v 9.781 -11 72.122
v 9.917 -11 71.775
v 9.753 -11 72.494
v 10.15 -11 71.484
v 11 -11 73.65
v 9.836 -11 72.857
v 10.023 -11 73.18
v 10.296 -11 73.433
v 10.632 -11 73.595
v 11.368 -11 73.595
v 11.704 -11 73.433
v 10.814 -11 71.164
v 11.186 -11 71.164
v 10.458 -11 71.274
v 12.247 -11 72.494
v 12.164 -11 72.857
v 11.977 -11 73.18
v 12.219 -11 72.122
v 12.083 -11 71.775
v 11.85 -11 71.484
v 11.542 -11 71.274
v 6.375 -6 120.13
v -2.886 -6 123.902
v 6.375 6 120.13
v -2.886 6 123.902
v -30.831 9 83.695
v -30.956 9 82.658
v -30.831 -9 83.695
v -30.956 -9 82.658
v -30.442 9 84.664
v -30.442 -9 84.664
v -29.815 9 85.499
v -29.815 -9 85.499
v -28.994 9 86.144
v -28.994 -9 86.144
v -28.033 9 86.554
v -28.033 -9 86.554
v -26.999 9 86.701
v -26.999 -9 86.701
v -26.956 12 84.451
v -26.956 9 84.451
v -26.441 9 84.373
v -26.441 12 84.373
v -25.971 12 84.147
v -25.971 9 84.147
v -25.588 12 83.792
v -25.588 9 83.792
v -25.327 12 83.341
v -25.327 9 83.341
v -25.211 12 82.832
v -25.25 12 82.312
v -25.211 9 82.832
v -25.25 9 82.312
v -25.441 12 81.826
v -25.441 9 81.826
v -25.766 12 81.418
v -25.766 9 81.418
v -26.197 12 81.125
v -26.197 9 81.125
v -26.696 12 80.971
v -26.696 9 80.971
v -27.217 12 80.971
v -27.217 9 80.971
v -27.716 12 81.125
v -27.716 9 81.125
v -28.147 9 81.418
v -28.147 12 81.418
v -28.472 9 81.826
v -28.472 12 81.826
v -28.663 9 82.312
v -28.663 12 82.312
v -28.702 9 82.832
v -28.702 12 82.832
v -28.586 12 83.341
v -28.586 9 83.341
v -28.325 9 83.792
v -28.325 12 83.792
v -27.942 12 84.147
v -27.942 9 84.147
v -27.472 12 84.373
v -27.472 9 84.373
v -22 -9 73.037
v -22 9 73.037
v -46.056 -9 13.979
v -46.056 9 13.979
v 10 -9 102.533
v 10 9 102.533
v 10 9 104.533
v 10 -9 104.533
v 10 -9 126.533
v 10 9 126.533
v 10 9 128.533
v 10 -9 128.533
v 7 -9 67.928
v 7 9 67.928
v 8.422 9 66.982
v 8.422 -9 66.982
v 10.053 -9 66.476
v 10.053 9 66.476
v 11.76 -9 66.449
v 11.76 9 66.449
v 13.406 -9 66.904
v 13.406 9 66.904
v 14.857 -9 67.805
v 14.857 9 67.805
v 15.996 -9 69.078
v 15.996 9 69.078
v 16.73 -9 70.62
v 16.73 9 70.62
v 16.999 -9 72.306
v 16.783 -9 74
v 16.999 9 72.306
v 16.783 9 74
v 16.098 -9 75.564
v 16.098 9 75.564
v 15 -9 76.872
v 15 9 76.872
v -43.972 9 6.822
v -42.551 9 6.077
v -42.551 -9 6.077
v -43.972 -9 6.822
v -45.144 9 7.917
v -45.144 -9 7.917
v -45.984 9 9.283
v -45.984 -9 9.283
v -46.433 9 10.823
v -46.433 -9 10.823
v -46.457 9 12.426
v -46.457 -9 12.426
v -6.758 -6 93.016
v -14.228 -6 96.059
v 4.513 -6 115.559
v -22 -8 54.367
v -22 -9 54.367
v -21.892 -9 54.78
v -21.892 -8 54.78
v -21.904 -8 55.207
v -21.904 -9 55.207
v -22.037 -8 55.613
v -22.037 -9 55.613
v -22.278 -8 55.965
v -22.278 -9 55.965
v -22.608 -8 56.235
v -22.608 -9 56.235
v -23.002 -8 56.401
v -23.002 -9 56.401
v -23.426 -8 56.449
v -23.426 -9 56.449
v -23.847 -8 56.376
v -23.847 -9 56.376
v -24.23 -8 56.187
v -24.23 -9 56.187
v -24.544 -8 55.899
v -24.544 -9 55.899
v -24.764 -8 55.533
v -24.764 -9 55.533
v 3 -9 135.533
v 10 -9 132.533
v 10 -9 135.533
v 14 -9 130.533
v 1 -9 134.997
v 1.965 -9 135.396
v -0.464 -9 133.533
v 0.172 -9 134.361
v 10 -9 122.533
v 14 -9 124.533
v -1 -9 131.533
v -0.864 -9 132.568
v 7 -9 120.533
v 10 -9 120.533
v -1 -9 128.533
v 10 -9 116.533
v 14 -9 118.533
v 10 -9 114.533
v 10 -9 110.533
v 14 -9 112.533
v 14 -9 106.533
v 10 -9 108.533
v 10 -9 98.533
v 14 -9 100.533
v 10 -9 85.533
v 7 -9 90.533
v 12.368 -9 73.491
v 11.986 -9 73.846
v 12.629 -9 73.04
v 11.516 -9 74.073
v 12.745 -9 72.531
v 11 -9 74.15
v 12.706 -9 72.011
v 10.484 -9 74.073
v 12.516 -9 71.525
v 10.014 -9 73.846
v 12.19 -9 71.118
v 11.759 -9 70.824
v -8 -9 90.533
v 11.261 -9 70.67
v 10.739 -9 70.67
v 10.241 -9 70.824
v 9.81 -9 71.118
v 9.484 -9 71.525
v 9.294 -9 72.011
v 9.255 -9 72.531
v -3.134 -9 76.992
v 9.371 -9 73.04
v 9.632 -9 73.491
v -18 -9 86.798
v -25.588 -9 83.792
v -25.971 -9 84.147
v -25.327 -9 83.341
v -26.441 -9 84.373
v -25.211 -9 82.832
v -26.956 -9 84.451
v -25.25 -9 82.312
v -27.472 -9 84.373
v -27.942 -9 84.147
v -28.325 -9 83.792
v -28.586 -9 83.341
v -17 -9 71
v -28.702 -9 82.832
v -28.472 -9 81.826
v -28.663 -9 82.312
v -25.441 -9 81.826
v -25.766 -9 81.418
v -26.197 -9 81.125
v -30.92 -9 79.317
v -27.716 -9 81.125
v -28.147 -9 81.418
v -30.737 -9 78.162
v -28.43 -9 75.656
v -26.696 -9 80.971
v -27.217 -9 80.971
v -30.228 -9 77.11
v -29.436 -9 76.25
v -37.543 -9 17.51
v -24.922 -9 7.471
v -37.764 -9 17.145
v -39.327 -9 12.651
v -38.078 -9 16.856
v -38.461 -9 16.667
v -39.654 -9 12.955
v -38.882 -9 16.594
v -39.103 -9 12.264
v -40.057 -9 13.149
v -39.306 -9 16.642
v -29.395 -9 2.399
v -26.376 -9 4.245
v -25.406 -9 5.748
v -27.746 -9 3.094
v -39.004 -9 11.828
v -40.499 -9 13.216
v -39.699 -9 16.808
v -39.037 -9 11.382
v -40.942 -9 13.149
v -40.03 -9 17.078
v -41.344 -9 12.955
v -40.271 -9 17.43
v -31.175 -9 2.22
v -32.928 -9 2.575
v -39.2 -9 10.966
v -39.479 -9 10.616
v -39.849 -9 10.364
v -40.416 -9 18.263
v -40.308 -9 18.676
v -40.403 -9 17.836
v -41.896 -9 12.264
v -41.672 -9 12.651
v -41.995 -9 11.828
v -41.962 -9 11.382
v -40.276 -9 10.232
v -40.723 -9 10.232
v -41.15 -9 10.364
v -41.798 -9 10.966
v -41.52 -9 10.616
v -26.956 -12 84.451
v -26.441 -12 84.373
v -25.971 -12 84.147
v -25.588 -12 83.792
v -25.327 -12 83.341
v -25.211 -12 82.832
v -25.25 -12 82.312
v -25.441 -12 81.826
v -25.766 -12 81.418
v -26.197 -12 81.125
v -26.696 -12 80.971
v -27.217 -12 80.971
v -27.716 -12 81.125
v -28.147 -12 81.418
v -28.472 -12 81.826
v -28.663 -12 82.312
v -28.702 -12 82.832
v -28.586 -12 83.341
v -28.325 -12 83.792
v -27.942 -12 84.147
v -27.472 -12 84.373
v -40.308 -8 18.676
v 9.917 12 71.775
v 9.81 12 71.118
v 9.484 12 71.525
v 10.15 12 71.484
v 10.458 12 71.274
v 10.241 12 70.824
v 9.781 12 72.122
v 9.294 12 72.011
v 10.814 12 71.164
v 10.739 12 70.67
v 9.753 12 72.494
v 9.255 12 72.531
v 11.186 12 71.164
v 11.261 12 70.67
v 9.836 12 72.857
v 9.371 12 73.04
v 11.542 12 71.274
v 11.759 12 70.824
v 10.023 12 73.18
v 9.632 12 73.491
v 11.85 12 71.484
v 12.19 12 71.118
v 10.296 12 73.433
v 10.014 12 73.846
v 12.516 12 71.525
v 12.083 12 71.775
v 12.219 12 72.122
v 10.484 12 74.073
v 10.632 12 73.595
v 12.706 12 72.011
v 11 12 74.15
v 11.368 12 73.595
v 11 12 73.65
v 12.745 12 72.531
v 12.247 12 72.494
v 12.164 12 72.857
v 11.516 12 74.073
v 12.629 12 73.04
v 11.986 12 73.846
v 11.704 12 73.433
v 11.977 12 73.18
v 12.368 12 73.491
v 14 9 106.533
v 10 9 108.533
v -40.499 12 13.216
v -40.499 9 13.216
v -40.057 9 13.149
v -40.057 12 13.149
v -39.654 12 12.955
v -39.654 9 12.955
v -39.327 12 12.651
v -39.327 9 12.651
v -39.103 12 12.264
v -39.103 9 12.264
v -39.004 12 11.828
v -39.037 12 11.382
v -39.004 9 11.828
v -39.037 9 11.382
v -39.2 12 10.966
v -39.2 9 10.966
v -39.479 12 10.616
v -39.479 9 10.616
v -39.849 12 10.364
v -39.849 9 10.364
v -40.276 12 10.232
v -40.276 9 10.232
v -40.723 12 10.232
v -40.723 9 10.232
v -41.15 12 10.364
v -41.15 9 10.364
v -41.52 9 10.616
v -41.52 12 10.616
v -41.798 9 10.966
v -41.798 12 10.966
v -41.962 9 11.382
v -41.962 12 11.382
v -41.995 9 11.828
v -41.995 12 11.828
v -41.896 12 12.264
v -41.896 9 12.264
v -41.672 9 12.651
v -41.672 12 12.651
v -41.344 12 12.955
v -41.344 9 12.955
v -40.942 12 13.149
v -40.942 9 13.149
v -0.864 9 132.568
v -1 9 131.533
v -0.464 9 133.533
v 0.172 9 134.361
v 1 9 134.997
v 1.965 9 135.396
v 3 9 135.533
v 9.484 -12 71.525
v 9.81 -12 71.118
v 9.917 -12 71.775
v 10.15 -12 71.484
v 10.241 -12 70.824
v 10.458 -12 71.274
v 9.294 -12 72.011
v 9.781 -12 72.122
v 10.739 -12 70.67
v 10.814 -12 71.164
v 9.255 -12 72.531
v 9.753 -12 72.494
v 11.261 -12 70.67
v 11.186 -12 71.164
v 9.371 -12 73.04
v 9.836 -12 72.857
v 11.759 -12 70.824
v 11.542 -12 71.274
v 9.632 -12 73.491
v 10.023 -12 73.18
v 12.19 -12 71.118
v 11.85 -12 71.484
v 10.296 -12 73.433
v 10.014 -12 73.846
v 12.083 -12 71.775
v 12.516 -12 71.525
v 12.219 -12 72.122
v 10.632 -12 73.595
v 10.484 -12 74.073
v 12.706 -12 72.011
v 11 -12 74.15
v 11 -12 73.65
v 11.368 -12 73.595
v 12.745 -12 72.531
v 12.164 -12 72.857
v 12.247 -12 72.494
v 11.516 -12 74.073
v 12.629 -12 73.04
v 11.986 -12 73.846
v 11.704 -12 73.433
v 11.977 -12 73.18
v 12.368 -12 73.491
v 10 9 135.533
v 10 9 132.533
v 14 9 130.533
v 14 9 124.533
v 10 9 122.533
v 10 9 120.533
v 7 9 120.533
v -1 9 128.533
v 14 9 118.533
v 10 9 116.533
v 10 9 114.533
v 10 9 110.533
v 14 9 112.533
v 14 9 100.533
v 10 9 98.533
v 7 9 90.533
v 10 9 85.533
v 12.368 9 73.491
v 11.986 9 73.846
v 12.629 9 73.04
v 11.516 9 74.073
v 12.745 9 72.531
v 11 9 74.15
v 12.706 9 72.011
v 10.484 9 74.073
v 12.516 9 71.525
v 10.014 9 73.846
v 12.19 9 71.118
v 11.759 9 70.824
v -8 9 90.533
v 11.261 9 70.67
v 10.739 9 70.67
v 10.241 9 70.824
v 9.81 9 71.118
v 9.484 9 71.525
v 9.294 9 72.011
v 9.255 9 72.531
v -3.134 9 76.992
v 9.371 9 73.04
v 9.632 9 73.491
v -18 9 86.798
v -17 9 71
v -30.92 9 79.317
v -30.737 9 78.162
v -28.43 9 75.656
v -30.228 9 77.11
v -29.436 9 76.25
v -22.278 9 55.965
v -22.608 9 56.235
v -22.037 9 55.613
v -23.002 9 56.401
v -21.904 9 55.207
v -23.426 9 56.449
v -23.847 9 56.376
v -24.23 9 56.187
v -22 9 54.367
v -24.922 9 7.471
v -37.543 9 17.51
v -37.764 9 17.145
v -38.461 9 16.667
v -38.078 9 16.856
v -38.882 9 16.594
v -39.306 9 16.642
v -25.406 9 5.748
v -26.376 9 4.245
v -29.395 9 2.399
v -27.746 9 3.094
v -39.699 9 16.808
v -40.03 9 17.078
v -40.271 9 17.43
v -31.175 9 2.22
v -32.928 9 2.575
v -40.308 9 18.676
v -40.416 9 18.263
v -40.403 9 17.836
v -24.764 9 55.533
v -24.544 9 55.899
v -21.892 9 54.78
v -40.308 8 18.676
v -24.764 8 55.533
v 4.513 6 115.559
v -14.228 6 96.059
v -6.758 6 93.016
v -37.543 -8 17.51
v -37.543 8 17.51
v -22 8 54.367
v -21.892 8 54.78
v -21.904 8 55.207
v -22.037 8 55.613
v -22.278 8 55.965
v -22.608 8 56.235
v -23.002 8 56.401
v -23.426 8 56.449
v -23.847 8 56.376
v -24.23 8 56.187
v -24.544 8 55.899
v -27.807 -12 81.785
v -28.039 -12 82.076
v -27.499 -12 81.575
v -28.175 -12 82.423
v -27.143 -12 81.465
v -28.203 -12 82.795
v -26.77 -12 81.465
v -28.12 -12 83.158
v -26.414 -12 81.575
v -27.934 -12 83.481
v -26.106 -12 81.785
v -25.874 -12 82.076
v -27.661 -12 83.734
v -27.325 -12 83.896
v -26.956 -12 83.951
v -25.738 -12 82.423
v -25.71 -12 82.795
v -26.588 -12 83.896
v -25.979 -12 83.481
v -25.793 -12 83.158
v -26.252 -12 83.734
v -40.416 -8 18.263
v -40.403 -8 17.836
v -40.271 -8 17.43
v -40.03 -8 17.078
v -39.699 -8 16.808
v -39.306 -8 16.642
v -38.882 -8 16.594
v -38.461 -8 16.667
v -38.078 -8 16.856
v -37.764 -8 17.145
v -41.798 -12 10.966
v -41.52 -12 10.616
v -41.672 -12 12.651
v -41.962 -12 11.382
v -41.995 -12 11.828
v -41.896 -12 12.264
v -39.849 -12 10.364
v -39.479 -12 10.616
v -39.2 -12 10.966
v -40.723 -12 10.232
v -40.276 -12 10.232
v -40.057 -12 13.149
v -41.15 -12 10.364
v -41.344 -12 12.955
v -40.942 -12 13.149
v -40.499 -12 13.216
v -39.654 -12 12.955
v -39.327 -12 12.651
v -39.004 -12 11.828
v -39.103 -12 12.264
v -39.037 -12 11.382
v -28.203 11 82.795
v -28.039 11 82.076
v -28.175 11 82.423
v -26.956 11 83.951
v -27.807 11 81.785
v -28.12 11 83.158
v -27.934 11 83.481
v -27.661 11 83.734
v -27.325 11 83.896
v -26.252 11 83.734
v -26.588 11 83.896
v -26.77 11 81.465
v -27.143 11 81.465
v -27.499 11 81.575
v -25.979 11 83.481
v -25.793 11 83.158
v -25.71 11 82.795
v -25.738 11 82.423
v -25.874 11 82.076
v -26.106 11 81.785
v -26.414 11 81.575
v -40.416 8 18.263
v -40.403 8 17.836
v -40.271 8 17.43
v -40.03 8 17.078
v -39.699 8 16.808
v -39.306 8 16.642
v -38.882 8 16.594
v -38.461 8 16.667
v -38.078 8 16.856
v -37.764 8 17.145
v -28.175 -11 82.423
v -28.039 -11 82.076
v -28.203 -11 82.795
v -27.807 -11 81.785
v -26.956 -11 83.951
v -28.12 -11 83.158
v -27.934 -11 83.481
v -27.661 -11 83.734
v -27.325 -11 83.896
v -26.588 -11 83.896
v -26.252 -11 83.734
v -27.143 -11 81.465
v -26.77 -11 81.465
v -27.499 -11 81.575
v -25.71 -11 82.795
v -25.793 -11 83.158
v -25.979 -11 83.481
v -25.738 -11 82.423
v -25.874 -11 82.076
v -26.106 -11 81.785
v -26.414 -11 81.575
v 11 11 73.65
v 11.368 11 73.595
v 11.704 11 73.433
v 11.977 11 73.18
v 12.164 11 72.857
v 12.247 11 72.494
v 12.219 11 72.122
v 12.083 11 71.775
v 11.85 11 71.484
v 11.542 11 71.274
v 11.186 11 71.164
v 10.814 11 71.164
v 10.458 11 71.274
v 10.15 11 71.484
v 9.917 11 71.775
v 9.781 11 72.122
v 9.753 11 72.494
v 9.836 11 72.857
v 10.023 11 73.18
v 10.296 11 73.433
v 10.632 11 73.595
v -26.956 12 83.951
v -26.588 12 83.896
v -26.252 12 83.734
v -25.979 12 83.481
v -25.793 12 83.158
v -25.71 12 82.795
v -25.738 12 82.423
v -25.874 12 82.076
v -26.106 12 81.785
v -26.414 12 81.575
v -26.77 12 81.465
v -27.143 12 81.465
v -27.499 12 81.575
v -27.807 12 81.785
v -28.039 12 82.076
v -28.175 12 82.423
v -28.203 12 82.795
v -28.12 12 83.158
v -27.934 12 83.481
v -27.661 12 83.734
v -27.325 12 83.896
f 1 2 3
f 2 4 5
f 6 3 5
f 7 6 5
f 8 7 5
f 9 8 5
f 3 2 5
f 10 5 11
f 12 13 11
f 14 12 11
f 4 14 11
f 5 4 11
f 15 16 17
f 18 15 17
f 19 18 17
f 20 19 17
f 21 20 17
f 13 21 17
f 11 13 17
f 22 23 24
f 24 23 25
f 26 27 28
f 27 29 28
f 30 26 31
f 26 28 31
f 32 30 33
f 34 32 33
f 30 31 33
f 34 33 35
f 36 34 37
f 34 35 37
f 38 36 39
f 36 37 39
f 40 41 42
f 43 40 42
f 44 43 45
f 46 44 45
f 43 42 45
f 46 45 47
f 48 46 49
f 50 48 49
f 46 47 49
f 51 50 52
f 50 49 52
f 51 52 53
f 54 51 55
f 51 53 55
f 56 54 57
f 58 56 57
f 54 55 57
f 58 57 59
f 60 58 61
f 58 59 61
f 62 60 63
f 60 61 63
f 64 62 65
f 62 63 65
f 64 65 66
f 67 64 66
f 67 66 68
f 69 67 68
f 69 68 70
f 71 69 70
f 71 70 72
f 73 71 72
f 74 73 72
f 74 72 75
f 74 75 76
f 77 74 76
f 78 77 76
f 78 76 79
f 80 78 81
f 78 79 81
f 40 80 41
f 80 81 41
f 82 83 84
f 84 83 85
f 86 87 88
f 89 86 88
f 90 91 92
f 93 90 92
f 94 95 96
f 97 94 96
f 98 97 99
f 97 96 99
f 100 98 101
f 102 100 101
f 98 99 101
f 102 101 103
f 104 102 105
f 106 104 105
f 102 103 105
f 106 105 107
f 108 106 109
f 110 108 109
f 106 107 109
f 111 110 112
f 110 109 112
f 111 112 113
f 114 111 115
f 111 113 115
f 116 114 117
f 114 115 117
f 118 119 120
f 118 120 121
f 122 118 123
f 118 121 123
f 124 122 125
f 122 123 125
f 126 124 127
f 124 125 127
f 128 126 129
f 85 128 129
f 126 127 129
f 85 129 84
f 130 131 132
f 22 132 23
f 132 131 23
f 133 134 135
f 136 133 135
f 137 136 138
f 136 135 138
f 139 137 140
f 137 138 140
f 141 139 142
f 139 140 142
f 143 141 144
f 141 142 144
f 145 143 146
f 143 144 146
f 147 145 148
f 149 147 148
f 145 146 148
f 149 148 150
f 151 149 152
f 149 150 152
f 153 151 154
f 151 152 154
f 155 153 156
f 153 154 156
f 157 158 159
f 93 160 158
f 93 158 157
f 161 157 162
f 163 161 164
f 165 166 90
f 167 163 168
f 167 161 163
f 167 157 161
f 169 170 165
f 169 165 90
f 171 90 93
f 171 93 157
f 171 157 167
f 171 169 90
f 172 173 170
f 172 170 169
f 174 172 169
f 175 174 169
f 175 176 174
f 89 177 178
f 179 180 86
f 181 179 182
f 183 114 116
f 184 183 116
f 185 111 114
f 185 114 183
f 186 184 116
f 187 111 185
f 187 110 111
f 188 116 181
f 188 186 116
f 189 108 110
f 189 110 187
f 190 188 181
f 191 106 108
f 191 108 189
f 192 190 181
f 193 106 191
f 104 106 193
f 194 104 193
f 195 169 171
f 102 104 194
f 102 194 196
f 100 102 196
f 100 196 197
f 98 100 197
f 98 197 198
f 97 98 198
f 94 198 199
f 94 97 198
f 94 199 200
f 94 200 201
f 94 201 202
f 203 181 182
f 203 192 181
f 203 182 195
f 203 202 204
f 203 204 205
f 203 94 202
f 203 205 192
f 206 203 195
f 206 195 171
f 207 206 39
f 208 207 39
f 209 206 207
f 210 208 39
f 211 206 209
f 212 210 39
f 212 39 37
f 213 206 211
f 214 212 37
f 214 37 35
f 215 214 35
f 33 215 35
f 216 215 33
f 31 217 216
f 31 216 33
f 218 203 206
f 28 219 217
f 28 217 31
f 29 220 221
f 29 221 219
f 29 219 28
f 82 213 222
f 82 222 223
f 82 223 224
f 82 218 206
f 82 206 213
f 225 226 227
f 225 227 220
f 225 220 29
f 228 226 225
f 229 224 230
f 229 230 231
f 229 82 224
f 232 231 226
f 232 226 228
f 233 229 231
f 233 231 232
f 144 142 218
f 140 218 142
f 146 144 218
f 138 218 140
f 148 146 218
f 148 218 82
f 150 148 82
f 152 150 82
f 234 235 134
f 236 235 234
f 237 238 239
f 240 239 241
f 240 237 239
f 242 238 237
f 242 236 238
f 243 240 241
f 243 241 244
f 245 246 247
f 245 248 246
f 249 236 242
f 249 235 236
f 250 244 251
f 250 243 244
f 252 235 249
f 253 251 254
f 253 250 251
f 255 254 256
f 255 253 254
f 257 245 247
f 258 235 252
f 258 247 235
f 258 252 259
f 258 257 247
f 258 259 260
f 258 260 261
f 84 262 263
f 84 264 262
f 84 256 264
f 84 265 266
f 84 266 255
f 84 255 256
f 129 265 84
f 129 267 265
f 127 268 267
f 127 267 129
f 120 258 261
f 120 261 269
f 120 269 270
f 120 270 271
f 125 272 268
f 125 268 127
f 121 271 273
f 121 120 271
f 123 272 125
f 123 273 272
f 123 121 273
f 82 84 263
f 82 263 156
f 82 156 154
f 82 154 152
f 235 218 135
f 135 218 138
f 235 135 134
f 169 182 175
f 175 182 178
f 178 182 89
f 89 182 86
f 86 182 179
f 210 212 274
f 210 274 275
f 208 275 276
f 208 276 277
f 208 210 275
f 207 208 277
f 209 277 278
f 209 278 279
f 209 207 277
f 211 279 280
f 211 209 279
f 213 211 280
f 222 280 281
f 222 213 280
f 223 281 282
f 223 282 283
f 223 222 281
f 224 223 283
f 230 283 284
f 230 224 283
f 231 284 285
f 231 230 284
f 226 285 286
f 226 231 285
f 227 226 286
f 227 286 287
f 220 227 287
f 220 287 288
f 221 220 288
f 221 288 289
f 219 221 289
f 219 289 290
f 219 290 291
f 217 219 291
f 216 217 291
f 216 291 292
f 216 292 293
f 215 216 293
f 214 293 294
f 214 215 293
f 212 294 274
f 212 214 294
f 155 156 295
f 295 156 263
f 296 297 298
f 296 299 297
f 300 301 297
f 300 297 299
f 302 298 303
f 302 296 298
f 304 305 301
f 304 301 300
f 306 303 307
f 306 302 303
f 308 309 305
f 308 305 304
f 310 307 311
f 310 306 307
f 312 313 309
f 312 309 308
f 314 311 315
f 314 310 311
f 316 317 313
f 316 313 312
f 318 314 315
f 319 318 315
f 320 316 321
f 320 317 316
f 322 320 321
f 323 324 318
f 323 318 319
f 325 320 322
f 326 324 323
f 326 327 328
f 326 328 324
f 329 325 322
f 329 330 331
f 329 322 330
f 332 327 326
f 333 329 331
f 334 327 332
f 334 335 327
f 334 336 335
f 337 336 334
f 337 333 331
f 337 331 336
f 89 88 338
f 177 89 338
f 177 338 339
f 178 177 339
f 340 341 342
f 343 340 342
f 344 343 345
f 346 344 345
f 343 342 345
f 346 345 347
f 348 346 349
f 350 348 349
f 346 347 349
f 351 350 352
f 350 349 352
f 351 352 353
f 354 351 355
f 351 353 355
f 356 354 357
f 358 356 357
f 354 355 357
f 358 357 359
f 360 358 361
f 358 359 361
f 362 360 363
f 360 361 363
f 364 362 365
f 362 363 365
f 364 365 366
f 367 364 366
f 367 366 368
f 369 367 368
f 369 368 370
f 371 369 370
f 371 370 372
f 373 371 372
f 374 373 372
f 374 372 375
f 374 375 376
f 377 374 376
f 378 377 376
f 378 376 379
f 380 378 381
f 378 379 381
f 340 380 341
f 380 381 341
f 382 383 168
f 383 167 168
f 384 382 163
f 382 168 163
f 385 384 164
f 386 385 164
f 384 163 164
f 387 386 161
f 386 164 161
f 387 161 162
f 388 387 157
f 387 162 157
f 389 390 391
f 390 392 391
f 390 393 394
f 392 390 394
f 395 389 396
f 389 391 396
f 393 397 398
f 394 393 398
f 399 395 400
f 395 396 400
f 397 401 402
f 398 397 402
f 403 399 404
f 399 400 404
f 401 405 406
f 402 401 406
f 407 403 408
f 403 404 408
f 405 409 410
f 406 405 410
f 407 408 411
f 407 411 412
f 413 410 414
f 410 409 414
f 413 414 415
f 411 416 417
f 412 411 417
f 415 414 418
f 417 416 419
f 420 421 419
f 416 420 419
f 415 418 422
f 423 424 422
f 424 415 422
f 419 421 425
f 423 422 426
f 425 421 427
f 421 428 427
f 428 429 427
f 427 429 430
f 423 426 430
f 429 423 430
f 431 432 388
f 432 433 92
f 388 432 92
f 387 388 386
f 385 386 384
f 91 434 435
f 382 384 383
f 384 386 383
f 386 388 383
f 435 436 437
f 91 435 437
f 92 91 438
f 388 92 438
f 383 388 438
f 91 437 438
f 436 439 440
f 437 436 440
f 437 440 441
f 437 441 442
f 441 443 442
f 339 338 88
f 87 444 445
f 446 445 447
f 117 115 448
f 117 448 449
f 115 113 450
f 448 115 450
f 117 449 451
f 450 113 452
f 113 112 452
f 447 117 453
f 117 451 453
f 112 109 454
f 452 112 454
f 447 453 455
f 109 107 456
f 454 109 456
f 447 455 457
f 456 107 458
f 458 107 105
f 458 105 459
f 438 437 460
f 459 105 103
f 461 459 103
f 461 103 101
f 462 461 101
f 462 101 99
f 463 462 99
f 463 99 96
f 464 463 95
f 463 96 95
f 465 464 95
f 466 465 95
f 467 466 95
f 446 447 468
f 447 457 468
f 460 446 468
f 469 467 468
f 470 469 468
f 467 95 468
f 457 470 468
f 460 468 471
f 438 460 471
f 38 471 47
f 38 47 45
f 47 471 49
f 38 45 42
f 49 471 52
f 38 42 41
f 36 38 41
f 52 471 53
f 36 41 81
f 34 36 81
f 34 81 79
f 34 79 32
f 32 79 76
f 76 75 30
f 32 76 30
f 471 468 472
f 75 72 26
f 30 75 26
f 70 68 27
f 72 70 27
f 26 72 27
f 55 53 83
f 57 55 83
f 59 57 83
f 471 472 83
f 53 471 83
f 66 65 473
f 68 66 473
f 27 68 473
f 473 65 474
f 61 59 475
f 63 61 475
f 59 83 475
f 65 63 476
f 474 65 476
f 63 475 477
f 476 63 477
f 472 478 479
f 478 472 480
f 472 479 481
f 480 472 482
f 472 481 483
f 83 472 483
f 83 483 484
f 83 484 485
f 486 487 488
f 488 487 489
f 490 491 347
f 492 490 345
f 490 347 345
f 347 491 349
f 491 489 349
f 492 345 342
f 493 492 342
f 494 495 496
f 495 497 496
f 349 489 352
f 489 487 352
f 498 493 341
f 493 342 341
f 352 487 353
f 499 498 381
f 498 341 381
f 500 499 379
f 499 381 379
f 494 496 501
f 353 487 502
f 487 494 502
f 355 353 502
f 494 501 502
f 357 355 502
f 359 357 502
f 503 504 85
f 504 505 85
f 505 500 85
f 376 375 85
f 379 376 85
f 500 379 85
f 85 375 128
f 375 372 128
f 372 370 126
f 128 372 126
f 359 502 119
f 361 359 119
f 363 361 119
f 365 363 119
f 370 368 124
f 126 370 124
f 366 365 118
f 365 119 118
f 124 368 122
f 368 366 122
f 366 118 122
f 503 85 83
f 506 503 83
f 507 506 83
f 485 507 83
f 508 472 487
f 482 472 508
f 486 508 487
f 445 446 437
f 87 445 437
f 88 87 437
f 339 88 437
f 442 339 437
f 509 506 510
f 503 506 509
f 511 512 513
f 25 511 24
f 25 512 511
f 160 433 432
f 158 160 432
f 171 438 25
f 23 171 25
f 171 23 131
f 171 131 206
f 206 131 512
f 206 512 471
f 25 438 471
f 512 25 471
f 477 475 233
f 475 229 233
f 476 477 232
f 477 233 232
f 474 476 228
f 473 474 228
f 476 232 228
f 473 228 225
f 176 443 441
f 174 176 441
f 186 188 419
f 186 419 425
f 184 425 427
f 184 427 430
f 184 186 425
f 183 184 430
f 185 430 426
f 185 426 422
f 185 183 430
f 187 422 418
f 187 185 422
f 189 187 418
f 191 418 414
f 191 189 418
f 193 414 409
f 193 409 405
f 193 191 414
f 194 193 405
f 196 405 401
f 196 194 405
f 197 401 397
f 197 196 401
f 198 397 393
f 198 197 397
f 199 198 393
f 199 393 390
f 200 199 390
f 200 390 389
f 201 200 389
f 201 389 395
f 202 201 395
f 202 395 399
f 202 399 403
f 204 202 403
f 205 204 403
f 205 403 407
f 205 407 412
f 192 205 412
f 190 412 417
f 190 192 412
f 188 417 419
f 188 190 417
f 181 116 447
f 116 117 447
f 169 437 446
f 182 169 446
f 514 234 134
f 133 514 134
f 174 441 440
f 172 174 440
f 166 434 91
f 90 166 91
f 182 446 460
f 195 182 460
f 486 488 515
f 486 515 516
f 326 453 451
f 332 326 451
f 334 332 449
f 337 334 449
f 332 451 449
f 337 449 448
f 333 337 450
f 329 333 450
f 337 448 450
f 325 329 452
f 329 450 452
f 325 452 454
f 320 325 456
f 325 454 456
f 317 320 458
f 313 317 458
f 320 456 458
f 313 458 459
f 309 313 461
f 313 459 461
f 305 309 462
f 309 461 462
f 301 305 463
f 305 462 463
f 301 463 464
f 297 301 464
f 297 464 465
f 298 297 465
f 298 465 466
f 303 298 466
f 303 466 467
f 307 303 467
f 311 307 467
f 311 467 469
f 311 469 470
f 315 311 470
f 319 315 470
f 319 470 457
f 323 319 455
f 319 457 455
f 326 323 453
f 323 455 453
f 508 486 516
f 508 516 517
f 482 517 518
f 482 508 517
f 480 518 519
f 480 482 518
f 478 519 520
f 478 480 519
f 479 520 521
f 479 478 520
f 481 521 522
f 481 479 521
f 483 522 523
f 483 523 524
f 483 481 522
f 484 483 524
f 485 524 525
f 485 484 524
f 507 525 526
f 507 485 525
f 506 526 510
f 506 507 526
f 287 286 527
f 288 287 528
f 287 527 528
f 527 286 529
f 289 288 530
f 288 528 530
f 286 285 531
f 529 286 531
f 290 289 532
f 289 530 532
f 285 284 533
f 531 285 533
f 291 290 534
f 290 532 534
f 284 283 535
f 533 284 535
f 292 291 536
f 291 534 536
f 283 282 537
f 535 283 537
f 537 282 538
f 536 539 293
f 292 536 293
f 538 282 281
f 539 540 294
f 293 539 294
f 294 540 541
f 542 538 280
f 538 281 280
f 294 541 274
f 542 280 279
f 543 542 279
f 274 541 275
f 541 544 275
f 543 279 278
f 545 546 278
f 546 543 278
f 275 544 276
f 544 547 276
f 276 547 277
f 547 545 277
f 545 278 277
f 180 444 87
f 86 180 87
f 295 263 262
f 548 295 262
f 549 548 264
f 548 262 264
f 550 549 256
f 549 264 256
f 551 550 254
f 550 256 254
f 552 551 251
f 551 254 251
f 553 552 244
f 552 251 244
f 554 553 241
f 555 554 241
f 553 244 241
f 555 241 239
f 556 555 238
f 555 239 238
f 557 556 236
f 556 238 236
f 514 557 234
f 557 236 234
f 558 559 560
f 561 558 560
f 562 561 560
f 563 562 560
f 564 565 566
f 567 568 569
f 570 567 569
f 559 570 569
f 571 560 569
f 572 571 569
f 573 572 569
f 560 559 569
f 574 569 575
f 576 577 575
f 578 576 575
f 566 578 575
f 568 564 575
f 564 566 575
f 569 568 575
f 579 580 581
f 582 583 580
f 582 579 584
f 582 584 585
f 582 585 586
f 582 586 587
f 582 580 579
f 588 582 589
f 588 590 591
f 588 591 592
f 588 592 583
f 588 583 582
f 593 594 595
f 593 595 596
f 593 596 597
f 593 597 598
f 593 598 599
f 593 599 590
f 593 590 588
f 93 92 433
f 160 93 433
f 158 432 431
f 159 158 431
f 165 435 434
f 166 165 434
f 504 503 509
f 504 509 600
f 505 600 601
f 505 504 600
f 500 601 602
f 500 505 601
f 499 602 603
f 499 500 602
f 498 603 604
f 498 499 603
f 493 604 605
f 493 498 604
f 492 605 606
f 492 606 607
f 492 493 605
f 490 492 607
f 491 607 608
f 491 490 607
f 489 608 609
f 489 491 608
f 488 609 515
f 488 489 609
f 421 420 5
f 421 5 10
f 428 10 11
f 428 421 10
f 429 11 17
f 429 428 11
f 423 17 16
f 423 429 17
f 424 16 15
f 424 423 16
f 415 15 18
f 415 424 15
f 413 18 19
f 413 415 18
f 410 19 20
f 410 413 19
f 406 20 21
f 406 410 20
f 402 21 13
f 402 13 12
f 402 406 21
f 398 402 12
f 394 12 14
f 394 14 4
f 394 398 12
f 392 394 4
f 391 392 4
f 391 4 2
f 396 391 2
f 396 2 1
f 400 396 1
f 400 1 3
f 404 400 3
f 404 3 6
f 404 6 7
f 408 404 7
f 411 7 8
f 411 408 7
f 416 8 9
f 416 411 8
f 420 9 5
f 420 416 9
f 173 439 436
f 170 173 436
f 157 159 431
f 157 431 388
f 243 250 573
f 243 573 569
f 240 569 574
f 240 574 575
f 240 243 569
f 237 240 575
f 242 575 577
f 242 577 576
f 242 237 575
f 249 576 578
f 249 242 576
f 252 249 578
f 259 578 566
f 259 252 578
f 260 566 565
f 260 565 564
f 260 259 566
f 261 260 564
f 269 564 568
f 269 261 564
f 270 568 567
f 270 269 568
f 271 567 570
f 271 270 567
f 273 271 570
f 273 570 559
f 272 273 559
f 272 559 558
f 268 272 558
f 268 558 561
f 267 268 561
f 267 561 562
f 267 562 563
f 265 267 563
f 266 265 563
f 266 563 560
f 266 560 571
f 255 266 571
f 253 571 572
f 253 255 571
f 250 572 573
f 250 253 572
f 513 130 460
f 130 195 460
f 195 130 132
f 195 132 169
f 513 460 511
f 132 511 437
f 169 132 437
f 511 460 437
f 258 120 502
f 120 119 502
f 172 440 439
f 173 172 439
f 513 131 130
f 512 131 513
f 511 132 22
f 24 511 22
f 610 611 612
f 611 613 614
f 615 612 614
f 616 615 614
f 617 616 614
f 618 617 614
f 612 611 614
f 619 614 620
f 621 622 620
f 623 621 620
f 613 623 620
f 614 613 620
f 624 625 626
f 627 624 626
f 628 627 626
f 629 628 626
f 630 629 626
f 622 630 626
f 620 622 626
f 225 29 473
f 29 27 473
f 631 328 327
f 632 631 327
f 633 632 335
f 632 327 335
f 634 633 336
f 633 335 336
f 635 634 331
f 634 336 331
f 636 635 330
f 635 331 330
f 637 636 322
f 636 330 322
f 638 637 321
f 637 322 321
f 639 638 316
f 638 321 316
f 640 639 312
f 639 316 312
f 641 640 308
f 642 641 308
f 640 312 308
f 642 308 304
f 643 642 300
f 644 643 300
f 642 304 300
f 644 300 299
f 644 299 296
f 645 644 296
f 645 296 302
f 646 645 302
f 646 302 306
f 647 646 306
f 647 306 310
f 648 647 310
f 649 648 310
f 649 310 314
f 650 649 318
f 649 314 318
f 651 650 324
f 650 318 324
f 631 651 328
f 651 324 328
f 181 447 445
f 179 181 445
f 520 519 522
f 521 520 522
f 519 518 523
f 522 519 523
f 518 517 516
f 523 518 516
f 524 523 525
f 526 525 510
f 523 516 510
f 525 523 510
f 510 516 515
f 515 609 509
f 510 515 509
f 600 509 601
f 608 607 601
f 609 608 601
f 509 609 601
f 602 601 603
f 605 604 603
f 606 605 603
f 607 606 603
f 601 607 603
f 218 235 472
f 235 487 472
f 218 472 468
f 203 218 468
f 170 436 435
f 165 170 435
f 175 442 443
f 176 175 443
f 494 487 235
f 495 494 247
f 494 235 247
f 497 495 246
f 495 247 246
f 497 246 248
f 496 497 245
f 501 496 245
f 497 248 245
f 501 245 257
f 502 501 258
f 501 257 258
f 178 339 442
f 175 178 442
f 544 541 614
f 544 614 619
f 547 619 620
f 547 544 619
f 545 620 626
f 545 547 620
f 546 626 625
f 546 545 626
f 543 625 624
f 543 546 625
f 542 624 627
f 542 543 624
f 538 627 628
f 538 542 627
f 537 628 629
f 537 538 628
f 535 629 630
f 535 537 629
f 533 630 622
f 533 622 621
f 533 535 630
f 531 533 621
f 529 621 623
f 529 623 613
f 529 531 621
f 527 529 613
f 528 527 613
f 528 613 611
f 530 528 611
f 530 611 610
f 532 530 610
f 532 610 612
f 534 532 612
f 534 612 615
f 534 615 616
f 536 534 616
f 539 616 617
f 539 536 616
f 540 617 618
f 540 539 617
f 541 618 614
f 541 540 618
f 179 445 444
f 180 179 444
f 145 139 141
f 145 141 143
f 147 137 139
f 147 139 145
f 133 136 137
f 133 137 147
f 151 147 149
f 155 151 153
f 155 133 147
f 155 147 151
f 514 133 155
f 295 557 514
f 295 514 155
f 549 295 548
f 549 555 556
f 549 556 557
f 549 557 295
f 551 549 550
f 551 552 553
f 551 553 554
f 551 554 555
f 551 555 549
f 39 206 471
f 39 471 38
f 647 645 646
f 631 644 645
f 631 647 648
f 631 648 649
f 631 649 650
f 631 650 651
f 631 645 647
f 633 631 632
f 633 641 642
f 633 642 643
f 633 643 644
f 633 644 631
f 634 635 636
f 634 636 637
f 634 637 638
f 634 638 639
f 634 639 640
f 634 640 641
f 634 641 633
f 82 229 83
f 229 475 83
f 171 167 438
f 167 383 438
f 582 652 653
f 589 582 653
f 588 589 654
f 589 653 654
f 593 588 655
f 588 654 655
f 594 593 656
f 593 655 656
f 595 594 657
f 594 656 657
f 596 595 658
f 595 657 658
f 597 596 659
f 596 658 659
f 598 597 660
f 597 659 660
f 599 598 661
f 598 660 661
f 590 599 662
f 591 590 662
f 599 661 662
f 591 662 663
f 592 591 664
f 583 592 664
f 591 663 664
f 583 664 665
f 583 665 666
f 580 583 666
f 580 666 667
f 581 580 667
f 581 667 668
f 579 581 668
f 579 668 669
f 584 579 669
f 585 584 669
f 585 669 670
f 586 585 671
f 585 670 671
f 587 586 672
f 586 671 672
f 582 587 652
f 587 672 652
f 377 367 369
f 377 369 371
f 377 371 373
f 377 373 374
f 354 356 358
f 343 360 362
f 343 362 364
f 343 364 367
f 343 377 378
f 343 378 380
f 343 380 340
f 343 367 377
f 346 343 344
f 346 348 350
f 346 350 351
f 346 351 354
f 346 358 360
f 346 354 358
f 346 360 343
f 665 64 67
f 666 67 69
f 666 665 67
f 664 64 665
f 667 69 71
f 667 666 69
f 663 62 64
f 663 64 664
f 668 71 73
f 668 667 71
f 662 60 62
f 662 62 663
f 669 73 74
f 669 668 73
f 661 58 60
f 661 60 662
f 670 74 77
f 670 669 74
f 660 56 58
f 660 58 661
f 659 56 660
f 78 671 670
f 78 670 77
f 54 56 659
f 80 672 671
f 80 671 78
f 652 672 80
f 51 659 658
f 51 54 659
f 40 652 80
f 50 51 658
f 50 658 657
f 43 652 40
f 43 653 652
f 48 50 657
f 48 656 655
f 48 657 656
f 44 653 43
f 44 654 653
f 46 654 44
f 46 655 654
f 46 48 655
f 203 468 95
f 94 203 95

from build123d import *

# Parameters (mm, degrees)
BOSS_EXTRUDE1_DEPTH = 9
FILLET1_R           = 6
FILLET2_R           = 4
BOSS_EXTRUDE2_DEPTH = 18
LPATTERN1_COUNT     = 6
LPATTERN1_PITCH     = 6
CUT_EXTRUDE1_DEPTH  = 145.41368733
SKETCH6_W           = 30.064521177
SKETCH6_H           = 12
CUT_EXTRUDE2_DEPTH  = 10
SKETCH8_R           = 1.75
SKETCH8_R_2         = 1.5
BOSS_EXTRUDE3_DEPTH = 3
SKETCH9_R           = 1.25
CUT_EXTRUDE4_DEPTH  = 1
SKETCH10_R          = 1.25
CUT_EXTRUDE5_DEPTH  = 1
CUT_EXTRUDE6_DEPTH  = 1


with BuildPart() as part:
    # Sketch2 → Boss-Extrude1 (new, symmetric)
    with BuildSketch(Plane(origin=(0, 0, 0), x_dir=(1, 0, 0), z_dir=(0, 1, 0))):
        with BuildLine():
            ThreePointArc((7, -67.928205718), (15.472135955, -68.400341673), (15, -76.872477628))
            Line((15, -76.872477628), (10, -85.532731666))
            Line((10, -85.532731666), (10, -135.532731666))
            Line((10, -135.532731666), (-1, -135.532731666))
            Line((-1, -135.532731666), (-1, -128.532731666))
            Line((-1, -128.532731666), (-18, -86.797721556))
            Line((-18, -86.797721556), (-30.999248866, -86.657975615))
            Line((-30.999248866, -86.657975615), (-30.891751988, -76.658553411))
            Line((-30.891751988, -76.658553411), (-17, -71))
            Line((-17, -71), (-3.134175553, -76.992487891))
            Line((-3.134175553, -76.992487891), (7, -67.928205718))
        make_face()
        Polygon((-17, -71), (-22, -73.036659384), (-48.406582583, -8.20848344), (-25.853959684, 0), align=None)
    extrude(amount=BOSS_EXTRUDE1_DEPTH, both=True)

    # Fillet1
    fillet1_edges = [part.edges().sort_by_distance(p)[0] for p in [
        (-48.406582583, 0, 8.20848344),
        (-25.853959684, 0, 0),
    ]]
    fillet(fillet1_edges, radius=FILLET1_R)

    # Fillet2
    fillet2_edges = [part.edges().sort_by_distance(p)[0] for p in [
        (-1, 0, 135.532731666),
        (-30.999248866, 0, 86.657975615),
        (-30.891751988, 0, 76.658553411),
    ]]
    fillet(fillet2_edges, radius=FILLET2_R)

    # Sketch3 → Boss-Extrude2 (add)
    with BuildSketch(Plane(origin=(0, 9, 0), x_dir=(1, 0, 0), z_dir=(0, 1, 0))):
        Polygon((10, -132.532731666), (10, -128.532731666), (14, -130.532731666), align=None)
    boss_extrude2 = extrude(amount=-BOSS_EXTRUDE2_DEPTH)

    # LPattern1: Boss-Extrude2 ×6
    with Locations(*[(0, 0, -i * LPATTERN1_PITCH) for i in range(1, LPATTERN1_COUNT)]):
        add(boss_extrude2)

    # Sketch5 → Cut-Extrude1 (cut, through all)
    with BuildSketch(Plane(origin=(0, 9, 0), x_dir=(1, 0, 0), z_dir=(0, 1, 0))):
        Polygon((7, -120.532731666), (7, -90.532731666), (-8, -90.532731666), align=None)
    extrude(amount=-CUT_EXTRUDE1_DEPTH, mode=Mode.SUBTRACT)

    # Sketch6 → Cut-Extrude2 (cut)
    with BuildSketch(Plane(origin=(-45.762584731, 0, 18.64055953), x_dir=(0.377236894037746, 0, 0.9261167992088009), z_dir=(-0.9261167992088009, 0, 0.377236894037746))):
        with Locations((98.626824562, 0)):
            Rectangle(SKETCH6_W, SKETCH6_H)
    extrude(amount=-CUT_EXTRUDE2_DEPTH, mode=Mode.SUBTRACT)

    # Sketch8 → Boss-Extrude3 (add)
    with BuildSketch(Plane(origin=(0, 9, 0), x_dir=(1, 0, 0), z_dir=(0, 1, 0))):
        with Locations(Location((-26.956481233, -82.701205484, 0), (0, 0, 270))):
            Circle(SKETCH8_R)
        with Locations(Location((11, -72.400341673, 0), (0, 0, 270))):
            Circle(SKETCH8_R)
        with Locations(Location((-40.499373495, -11.715561331, 0), (0, 0, 270))):
            Circle(SKETCH8_R_2)
    boss_extrude3 = extrude(amount=BOSS_EXTRUDE3_DEPTH)

    # Sketch9 → Cut-Extrude4 (cut)
    with BuildSketch(Plane(origin=(0, 12, 0), x_dir=(1, 0, 0), z_dir=(0, 1, 0))):
        with Locations(Location((-26.956481233, -82.701205484, 0), (0, 0, 270))):
            Circle(SKETCH9_R)
    cut_extrude4 = extrude(amount=-CUT_EXTRUDE4_DEPTH, mode=Mode.SUBTRACT)

    # Sketch10 → Cut-Extrude5 (cut)
    with BuildSketch(Plane(origin=(0, 12, 0), x_dir=(1, 0, 0), z_dir=(0, 1, 0))):
        with Locations(Location((11, -72.400341673, 0), (0, 0, 270))):
            Circle(SKETCH10_R)
    cut_extrude5 = extrude(amount=-CUT_EXTRUDE5_DEPTH, mode=Mode.SUBTRACT)

    # Sketch11 → Cut-Extrude6 (cut)
    with BuildSketch(Plane(origin=(0, 9, 0), x_dir=(1, 0, 0), z_dir=(0, 1, 0))):
        with BuildLine():
            Line((-37.543355443, -17.510445966), (-22, -54.366980008))
            ThreePointArc((-22, -54.366980008), (-22.799244197, -56.331975863), (-24.764240053, -55.532731666))
            Line((-24.764240053, -55.532731666), (-40.307595496, -18.676197624))
            ThreePointArc((-40.307595496, -18.676197624), (-39.508351299, -16.711201768), (-37.543355443, -17.510445966))
        make_face()
    cut_extrude6 = extrude(amount=-CUT_EXTRUDE6_DEPTH, mode=Mode.SUBTRACT)

    # Mirror1: Boss-Extrude3, Cut-Extrude4, Cut-Extrude5, Cut-Extrude6 across plane
    add(boss_extrude3.mirror(Plane.ZX))
    add(cut_extrude4.mirror(Plane.ZX), mode=Mode.SUBTRACT)
    add(cut_extrude5.mirror(Plane.ZX), mode=Mode.SUBTRACT)
    add(cut_extrude6.mirror(Plane.ZX), mode=Mode.SUBTRACT)


solid = part.part
